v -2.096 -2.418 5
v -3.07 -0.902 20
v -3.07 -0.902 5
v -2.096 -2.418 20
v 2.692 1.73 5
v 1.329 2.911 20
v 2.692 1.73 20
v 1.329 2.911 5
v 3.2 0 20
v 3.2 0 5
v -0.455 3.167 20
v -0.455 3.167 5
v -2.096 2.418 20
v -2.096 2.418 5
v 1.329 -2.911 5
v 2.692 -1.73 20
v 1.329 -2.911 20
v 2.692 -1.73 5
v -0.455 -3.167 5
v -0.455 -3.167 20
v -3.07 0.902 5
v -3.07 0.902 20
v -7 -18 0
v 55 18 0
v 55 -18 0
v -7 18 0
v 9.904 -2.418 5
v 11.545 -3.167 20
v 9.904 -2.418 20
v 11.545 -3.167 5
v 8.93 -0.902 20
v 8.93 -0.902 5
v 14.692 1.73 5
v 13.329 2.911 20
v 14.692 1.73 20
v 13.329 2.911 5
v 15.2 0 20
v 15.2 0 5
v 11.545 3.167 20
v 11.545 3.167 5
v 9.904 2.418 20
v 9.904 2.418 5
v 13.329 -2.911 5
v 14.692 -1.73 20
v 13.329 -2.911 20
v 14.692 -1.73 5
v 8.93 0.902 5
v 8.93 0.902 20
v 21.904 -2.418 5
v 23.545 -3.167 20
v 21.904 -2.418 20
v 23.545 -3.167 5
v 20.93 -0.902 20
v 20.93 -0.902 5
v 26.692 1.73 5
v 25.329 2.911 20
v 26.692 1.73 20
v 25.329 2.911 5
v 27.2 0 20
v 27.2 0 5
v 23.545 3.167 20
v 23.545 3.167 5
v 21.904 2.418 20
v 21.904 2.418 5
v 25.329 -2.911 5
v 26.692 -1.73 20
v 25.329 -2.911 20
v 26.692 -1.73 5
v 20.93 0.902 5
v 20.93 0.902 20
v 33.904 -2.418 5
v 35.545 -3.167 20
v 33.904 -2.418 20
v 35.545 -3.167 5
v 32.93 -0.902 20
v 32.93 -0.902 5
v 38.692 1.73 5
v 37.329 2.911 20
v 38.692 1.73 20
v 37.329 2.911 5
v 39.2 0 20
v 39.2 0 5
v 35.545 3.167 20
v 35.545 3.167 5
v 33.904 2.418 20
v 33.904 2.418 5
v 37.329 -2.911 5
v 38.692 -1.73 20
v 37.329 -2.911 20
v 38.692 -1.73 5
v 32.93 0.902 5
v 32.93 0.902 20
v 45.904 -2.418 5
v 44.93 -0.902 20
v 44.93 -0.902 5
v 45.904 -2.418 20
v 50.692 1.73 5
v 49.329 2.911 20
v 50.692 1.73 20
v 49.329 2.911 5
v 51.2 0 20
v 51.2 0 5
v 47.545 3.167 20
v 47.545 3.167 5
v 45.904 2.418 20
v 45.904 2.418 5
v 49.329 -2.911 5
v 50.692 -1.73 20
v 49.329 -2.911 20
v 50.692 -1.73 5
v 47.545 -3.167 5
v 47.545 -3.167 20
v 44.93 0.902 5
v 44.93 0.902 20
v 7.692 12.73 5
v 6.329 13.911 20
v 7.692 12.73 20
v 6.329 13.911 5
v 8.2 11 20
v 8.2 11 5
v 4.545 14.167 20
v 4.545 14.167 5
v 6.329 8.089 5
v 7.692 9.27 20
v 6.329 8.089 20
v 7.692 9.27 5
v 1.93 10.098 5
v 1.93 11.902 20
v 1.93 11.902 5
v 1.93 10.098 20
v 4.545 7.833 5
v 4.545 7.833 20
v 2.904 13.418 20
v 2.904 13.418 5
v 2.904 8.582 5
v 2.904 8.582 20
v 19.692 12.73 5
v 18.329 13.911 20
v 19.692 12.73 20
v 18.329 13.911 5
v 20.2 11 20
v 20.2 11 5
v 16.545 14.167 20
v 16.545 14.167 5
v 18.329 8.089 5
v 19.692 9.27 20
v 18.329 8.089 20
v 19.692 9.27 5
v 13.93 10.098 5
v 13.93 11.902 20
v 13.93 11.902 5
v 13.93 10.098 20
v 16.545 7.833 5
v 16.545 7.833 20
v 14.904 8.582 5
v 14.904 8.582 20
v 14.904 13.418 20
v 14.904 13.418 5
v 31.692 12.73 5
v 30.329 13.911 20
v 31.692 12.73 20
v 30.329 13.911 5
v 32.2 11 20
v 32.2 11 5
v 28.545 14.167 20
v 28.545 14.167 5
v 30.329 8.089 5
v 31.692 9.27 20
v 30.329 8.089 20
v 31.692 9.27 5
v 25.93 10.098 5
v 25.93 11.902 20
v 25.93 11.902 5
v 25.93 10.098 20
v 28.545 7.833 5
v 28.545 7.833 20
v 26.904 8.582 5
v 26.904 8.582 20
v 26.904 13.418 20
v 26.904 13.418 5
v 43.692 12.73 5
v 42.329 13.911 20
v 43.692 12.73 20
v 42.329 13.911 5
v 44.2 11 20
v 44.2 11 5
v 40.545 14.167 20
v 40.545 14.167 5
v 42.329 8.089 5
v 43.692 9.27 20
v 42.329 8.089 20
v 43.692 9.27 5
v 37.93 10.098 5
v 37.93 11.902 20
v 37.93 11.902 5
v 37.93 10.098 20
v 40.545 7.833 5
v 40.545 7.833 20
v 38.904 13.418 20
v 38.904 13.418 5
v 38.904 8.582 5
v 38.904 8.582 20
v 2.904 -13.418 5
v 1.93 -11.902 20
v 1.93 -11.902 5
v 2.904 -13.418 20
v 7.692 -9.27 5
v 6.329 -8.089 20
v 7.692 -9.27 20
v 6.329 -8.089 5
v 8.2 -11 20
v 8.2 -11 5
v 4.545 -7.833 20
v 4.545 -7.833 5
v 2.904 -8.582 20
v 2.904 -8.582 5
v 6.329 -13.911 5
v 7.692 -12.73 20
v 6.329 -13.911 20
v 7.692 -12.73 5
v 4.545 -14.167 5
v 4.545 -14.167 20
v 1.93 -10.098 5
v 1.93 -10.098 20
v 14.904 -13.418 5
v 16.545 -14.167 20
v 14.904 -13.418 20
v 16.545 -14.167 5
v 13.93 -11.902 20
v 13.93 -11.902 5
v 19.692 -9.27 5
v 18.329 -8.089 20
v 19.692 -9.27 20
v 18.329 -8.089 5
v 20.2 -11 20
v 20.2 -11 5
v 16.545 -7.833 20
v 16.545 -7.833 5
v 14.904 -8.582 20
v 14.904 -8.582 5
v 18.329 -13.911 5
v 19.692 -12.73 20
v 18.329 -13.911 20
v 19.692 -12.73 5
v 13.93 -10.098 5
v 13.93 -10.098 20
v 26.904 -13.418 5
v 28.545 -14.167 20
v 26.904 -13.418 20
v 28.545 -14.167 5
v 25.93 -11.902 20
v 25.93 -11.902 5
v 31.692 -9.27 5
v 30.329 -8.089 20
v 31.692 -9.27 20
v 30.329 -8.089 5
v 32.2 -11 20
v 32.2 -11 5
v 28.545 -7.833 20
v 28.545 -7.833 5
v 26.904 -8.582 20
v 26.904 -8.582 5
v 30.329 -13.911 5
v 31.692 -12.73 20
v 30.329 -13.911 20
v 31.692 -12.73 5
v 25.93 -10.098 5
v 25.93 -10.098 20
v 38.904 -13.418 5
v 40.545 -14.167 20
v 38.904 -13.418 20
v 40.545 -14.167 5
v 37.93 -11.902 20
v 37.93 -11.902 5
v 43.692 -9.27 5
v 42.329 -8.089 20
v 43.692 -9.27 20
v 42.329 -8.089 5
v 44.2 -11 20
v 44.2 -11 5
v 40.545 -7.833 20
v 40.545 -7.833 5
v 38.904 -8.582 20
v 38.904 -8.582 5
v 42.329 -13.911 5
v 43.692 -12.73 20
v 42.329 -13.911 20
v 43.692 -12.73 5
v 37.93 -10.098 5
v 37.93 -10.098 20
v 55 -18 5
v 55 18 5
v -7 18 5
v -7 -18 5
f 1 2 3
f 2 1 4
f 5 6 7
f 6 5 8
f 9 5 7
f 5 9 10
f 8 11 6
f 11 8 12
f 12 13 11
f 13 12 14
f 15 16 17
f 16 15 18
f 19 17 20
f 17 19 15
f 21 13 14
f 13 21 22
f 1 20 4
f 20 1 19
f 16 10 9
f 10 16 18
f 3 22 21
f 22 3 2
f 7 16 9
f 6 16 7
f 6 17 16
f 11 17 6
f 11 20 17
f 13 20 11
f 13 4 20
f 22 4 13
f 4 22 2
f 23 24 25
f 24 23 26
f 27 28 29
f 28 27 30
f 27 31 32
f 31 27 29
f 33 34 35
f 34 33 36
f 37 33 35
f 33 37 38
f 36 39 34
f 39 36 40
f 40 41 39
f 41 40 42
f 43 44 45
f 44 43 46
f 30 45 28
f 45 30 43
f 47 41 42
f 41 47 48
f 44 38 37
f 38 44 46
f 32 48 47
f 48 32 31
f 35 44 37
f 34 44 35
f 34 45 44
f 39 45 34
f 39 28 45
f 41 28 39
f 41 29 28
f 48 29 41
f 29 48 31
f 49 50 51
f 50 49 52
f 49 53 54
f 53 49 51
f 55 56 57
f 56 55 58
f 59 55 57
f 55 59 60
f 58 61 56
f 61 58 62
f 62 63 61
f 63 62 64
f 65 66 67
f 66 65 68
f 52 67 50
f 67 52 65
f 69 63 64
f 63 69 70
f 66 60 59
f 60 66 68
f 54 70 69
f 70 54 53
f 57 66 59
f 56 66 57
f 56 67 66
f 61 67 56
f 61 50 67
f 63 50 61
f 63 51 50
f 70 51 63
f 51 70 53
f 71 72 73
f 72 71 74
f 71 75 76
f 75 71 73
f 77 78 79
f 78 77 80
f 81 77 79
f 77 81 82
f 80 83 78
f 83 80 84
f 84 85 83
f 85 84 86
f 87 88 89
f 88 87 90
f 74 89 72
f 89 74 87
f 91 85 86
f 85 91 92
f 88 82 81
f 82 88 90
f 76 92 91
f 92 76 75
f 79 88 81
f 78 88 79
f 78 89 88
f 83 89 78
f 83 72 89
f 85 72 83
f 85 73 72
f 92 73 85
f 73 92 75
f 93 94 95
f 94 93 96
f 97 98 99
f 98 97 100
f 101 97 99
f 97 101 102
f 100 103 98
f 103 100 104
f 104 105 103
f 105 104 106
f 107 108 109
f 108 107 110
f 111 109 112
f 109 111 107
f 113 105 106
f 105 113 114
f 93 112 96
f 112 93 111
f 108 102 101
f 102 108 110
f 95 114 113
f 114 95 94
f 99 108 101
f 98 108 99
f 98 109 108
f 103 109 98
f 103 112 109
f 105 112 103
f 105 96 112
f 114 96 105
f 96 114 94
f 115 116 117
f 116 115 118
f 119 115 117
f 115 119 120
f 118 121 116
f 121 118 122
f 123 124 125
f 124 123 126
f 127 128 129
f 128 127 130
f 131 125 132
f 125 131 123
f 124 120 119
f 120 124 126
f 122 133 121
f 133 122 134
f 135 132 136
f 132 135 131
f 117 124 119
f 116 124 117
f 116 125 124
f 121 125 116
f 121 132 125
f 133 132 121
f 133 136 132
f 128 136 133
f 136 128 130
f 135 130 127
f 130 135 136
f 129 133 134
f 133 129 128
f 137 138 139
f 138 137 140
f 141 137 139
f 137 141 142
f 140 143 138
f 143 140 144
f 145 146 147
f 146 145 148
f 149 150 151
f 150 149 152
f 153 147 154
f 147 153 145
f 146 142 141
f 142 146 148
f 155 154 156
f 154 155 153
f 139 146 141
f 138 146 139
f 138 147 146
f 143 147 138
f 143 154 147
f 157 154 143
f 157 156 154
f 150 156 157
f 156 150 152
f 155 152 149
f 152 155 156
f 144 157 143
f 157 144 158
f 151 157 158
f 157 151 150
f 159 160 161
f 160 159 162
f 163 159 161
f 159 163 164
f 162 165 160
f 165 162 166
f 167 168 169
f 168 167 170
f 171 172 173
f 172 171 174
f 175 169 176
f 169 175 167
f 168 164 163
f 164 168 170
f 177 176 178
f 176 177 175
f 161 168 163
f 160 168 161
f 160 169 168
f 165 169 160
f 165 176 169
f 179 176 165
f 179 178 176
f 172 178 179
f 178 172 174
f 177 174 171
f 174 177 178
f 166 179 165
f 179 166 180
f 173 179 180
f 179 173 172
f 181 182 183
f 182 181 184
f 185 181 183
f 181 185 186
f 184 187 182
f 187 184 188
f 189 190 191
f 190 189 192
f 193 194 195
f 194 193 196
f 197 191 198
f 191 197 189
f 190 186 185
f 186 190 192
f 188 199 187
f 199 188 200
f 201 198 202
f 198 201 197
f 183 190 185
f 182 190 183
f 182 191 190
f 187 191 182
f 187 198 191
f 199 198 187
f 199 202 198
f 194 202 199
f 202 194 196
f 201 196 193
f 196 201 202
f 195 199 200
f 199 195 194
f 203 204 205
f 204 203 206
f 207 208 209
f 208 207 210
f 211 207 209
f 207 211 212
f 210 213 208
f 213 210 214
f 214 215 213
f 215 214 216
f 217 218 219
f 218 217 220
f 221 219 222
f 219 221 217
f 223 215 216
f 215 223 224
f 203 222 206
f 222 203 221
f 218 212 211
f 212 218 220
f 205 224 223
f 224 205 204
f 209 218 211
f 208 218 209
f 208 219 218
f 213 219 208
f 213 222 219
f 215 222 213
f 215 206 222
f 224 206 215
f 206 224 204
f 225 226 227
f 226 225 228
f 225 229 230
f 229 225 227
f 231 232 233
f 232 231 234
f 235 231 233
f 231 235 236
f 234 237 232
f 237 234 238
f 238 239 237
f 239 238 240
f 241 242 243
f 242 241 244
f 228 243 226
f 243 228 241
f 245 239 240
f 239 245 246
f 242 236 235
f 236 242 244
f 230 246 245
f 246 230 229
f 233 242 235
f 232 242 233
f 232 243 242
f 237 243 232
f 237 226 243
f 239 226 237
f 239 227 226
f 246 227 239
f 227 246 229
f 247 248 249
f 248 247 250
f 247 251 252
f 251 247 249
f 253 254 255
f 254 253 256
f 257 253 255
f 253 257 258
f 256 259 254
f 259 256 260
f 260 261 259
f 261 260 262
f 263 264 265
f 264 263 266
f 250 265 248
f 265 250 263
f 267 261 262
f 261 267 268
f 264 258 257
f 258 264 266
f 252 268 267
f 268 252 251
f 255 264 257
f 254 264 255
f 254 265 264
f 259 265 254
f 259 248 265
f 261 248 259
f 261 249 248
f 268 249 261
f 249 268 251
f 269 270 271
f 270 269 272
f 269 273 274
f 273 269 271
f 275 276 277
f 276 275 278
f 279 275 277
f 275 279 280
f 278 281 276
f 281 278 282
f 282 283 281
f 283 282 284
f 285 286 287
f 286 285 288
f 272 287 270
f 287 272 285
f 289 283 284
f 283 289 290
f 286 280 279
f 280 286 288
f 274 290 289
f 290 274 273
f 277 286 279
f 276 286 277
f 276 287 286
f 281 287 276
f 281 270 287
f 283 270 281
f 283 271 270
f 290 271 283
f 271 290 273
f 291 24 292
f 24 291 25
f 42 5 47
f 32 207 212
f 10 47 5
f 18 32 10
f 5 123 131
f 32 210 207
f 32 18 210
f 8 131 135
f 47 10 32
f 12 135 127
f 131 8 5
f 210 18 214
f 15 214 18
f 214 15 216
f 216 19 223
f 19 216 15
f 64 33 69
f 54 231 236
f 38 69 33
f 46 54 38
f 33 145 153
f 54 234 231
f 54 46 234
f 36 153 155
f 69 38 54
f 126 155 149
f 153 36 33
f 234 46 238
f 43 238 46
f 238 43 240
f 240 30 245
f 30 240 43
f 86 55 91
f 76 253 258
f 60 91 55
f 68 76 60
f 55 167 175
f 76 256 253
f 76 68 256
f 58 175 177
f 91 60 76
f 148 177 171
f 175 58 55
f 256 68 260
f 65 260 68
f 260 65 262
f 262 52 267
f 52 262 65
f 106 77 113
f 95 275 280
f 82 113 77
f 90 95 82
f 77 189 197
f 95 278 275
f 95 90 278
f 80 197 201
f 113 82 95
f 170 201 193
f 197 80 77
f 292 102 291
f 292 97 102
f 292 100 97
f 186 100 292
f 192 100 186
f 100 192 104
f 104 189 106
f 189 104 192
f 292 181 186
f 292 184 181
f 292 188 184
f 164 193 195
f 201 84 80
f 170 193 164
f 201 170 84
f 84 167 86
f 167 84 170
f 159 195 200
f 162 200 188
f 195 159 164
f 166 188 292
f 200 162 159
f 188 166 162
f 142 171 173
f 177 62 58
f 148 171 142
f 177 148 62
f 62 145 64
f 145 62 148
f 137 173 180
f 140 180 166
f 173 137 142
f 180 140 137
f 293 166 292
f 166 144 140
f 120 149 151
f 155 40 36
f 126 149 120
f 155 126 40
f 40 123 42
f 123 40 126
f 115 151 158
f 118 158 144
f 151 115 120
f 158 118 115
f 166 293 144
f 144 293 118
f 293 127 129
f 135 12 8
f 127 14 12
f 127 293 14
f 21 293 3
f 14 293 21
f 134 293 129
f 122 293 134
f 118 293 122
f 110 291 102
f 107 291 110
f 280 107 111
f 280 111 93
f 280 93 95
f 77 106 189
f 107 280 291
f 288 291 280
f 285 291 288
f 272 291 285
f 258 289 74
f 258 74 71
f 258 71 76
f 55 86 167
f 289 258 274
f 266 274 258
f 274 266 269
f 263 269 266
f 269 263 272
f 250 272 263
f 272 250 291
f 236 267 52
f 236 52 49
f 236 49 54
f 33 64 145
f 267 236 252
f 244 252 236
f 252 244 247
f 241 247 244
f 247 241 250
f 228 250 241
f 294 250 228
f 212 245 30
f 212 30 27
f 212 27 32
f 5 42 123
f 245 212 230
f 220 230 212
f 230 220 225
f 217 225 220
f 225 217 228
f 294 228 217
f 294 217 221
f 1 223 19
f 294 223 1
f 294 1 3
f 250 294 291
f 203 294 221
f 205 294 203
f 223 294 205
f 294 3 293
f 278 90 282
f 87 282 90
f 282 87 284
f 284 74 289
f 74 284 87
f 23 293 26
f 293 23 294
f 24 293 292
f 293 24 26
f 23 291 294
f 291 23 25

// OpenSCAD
radius = 5;
height = 20;


translate([-7, -18, 0]){
    cube([62, 36, 5]);
};


for(i = [0:4]){
    translate([i * (radius + 7), 0, 0]){
            cylinder(height, radius - 1.8, radius - 1.8);
     
    };
};

translate([5, 0, 0]){
    for(i = [0:3]){
        translate([i * (radius + 7), 11, 0]){
                cylinder(height, radius - 1.8, radius - 1.8);
        };
    };
};

translate([5, 0, 0]){
    for(i = [0:3]){
        translate([i * (radius + 7), - 11, 0]){
                cylinder(height, radius - 1.8, radius - 1.8);
        };
    };
};
